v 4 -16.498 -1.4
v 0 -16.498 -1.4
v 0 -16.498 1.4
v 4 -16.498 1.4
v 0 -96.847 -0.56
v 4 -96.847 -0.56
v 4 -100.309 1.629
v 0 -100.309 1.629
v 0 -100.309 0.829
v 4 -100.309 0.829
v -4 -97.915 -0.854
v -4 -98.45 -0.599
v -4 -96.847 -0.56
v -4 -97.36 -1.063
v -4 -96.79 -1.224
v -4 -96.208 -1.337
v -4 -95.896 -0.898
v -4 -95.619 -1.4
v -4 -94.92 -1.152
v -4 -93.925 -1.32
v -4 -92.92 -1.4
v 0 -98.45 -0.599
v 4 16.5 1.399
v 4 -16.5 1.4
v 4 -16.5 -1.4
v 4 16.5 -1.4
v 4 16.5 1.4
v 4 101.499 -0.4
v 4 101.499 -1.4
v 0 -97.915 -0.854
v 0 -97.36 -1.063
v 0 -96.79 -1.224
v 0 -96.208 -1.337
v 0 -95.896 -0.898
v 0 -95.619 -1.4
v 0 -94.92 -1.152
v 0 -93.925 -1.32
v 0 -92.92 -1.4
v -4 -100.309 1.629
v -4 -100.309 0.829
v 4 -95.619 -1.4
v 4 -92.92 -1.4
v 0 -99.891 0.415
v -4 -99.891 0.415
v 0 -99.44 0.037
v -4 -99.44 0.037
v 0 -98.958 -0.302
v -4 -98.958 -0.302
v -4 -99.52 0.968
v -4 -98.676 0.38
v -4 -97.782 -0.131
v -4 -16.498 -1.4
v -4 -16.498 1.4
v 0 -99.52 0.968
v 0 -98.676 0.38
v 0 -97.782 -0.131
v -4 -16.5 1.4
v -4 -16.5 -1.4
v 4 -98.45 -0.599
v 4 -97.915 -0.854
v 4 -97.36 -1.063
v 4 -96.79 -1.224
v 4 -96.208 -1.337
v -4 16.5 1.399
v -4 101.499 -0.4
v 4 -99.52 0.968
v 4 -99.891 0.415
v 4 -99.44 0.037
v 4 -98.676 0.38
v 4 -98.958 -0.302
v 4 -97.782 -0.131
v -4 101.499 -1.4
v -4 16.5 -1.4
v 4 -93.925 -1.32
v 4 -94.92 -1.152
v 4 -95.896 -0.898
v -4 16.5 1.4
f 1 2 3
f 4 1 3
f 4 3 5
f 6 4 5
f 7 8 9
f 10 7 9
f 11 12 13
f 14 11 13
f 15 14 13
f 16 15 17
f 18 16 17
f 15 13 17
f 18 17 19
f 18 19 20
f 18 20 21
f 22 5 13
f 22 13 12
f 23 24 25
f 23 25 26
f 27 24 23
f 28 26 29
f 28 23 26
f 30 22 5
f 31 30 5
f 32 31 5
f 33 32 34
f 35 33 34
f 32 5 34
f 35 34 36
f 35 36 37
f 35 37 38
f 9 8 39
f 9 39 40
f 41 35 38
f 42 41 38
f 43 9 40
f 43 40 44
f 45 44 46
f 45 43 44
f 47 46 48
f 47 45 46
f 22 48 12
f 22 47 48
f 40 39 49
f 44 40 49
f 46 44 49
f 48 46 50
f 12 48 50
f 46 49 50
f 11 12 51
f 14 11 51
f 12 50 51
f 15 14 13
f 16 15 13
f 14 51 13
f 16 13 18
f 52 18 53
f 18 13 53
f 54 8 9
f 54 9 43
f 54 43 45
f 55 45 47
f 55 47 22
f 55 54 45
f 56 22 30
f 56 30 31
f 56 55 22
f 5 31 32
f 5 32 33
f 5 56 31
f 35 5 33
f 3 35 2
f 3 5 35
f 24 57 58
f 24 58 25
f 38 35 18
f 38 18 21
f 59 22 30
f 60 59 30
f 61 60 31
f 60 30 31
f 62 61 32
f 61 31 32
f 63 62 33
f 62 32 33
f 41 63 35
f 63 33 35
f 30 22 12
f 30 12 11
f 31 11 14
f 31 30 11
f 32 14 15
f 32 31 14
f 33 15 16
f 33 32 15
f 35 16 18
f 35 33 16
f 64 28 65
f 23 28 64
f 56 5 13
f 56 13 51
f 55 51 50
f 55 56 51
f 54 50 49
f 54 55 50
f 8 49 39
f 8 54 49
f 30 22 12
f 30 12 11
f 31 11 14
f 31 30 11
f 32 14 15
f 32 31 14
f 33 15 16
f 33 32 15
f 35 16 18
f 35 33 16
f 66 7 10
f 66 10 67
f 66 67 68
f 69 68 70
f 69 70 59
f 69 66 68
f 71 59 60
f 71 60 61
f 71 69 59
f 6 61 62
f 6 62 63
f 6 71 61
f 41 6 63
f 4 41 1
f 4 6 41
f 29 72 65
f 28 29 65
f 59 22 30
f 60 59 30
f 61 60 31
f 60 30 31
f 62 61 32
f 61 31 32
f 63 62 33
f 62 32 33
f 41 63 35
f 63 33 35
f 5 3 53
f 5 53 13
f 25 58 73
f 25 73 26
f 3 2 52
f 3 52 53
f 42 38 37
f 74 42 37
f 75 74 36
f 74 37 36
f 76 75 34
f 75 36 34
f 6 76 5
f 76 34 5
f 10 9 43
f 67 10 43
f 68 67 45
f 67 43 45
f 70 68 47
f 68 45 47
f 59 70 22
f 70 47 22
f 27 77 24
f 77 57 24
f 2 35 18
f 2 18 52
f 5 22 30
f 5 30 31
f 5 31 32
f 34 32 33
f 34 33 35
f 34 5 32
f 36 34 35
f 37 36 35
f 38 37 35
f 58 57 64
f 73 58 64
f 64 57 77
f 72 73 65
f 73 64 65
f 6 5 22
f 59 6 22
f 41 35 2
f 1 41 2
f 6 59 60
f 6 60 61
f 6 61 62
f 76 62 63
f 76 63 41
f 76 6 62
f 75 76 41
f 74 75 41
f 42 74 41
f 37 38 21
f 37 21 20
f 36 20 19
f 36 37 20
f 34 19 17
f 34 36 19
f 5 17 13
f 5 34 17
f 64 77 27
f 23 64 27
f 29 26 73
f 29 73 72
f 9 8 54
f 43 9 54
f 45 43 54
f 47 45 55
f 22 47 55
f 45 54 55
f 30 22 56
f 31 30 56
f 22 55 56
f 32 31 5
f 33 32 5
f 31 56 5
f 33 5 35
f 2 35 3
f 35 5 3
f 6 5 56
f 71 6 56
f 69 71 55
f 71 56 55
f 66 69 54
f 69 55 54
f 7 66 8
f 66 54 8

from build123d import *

# Parameters (mm, degrees)
F0_W     = 8
F0_H     = 2.8
F1_DEPTH = 16.5
F2_DEPTH = 16.5
F4_DEPTH = 4
F5_DEPTH = 4
F6_DEPTH = 4
F7_DEPTH = 4


# Not quite as in the source:
# - a feature names something its author has since deleted; it is built from what else it names


with BuildPart() as f1:
    # F0 (on Front) → F1 (new body)
    with BuildSketch(Plane.XZ):
        Rectangle(F0_W, F0_H)
    extrude(amount=F1_DEPTH)

    # F0 (on Front) → F2 (join)
    with BuildSketch(Plane.XZ):
        Rectangle(F0_W, F0_H)
    extrude(amount=-F2_DEPTH)

    # F3 (on Right) → F4 (join)
    with BuildSketch(Plane.YZ):
        Polygon((101.4993405342, -0.3997026253), (16.4993405342, 1.3993438333), (16.4993405342, -1.3997026253), (101.4993405342, -1.3997026253), align=None)
    extrude(amount=F4_DEPTH)

    # F3 (on Right) → F5 (join)
    with BuildSketch(Plane.YZ):
        Polygon((101.4993405342, -0.3997026253), (16.4993405342, 1.3993438333), (16.4993405342, -1.3997026253), (101.4993405342, -1.3997026253), align=None)
    extrude(amount=-F5_DEPTH)


with BuildPart() as f4:
    # F3 (on Right) → F4, piece 2 (new body)
    with BuildSketch(Plane.YZ):
        with BuildLine():
            Line((-94.7134718299, -1.3999422081), (-92.9198265076, -1.3999422081))
            ThreePointArc((-92.9198265076, -1.3999422081), (-94.9201368355, -1.1517222137), (-96.8468752203, -0.5596632892))
            Line((-96.8468752203, -0.5596632892), (-98.4500434109, -0.5987649524))
            ThreePointArc((-98.4500434109, -0.5987649524), (-97.0768797518, -1.1494141491), (-95.618788992, -1.3999422081))
            Line((-95.618788992, -1.3999422081), (-94.7134718299, -1.3999422081))
        make_face()
    extrude(amount=F4_DEPTH)


with BuildPart() as f5:
    # F3 (on Right) → F5, piece 2 (new body)
    with BuildSketch(Plane.YZ):
        with BuildLine():
            Line((-94.7134718299, -1.3999422081), (-92.9198265076, -1.3999422081))
            ThreePointArc((-92.9198265076, -1.3999422081), (-94.9201368355, -1.1517222137), (-96.8468752203, -0.5596632892))
            Line((-96.8468752203, -0.5596632892), (-98.4500434109, -0.5987649524))
            ThreePointArc((-98.4500434109, -0.5987649524), (-97.0768797518, -1.1494141491), (-95.618788992, -1.3999422081))
            Line((-95.618788992, -1.3999422081), (-94.7134718299, -1.3999422081))
        make_face()
    extrude(amount=-F5_DEPTH)


with BuildPart() as f6:
    # F3 (on Right) → F6 (new body)
    with BuildSketch(Plane.YZ):
        with BuildLine():
            Line((-92.9198265076, -1.3999422081), (-16.4983108938, -1.3999422081))
            Line((-16.4983108938, -1.3999422081), (-16.4983108938, 1.4000577919))
            Line((-16.4983108938, 1.4000577919), (-96.8468752203, -0.5596632892))
            ThreePointArc((-96.8468752203, -0.5596632892), (-94.9201368355, -1.1517222137), (-92.9198265076, -1.3999422081))
        make_face()
        with BuildLine():
            Line((-98.4500434109, -0.5987649524), (-96.8468752203, -0.5596632892))
            ThreePointArc((-96.8468752203, -0.5596632892), (-98.6758535312, 0.3799035578), (-100.3093346953, 1.6287777741))
            Line((-100.3093346953, 1.6287777741), (-100.3093346953, 0.8287777741))
            ThreePointArc((-100.3093346953, 0.8287777741), (-99.4397174277, 0.036822948), (-98.4500434109, -0.5987649524))
        make_face()
        with BuildLine():
            Line((-94.7134718299, -1.3999422081), (-92.9198265076, -1.3999422081))
            ThreePointArc((-92.9198265076, -1.3999422081), (-94.9201368355, -1.1517222137), (-96.8468752203, -0.5596632892))
            Line((-96.8468752203, -0.5596632892), (-98.4500434109, -0.5987649524))
            ThreePointArc((-98.4500434109, -0.5987649524), (-97.0768797518, -1.1494141491), (-95.618788992, -1.3999422081))
            Line((-95.618788992, -1.3999422081), (-94.7134718299, -1.3999422081))
        make_face()
    extrude(amount=F6_DEPTH)


with BuildPart() as f7:
    # F3 (on Right) → F7 (new body)
    with BuildSketch(Plane.YZ):
        with BuildLine():
            Line((-92.9198265076, -1.3999422081), (-16.4983108938, -1.3999422081))
            Line((-16.4983108938, -1.3999422081), (-16.4983108938, 1.4000577919))
            Line((-16.4983108938, 1.4000577919), (-96.8468752203, -0.5596632892))
            ThreePointArc((-96.8468752203, -0.5596632892), (-94.9201368355, -1.1517222137), (-92.9198265076, -1.3999422081))
        make_face()
        with BuildLine():
            Line((-98.4500434109, -0.5987649524), (-96.8468752203, -0.5596632892))
            ThreePointArc((-96.8468752203, -0.5596632892), (-98.6758535312, 0.3799035578), (-100.3093346953, 1.6287777741))
            Line((-100.3093346953, 1.6287777741), (-100.3093346953, 0.8287777741))
            ThreePointArc((-100.3093346953, 0.8287777741), (-99.4397174277, 0.036822948), (-98.4500434109, -0.5987649524))
        make_face()
        with BuildLine():
            Line((-94.7134718299, -1.3999422081), (-92.9198265076, -1.3999422081))
            ThreePointArc((-92.9198265076, -1.3999422081), (-94.9201368355, -1.1517222137), (-96.8468752203, -0.5596632892))
            Line((-96.8468752203, -0.5596632892), (-98.4500434109, -0.5987649524))
            ThreePointArc((-98.4500434109, -0.5987649524), (-97.0768797518, -1.1494141491), (-95.618788992, -1.3999422081))
            Line((-95.618788992, -1.3999422081), (-94.7134718299, -1.3999422081))
        make_face()
    extrude(amount=-F7_DEPTH)


solid = Compound([f1.part, f4.part, f5.part, f6.part, f7.part])
